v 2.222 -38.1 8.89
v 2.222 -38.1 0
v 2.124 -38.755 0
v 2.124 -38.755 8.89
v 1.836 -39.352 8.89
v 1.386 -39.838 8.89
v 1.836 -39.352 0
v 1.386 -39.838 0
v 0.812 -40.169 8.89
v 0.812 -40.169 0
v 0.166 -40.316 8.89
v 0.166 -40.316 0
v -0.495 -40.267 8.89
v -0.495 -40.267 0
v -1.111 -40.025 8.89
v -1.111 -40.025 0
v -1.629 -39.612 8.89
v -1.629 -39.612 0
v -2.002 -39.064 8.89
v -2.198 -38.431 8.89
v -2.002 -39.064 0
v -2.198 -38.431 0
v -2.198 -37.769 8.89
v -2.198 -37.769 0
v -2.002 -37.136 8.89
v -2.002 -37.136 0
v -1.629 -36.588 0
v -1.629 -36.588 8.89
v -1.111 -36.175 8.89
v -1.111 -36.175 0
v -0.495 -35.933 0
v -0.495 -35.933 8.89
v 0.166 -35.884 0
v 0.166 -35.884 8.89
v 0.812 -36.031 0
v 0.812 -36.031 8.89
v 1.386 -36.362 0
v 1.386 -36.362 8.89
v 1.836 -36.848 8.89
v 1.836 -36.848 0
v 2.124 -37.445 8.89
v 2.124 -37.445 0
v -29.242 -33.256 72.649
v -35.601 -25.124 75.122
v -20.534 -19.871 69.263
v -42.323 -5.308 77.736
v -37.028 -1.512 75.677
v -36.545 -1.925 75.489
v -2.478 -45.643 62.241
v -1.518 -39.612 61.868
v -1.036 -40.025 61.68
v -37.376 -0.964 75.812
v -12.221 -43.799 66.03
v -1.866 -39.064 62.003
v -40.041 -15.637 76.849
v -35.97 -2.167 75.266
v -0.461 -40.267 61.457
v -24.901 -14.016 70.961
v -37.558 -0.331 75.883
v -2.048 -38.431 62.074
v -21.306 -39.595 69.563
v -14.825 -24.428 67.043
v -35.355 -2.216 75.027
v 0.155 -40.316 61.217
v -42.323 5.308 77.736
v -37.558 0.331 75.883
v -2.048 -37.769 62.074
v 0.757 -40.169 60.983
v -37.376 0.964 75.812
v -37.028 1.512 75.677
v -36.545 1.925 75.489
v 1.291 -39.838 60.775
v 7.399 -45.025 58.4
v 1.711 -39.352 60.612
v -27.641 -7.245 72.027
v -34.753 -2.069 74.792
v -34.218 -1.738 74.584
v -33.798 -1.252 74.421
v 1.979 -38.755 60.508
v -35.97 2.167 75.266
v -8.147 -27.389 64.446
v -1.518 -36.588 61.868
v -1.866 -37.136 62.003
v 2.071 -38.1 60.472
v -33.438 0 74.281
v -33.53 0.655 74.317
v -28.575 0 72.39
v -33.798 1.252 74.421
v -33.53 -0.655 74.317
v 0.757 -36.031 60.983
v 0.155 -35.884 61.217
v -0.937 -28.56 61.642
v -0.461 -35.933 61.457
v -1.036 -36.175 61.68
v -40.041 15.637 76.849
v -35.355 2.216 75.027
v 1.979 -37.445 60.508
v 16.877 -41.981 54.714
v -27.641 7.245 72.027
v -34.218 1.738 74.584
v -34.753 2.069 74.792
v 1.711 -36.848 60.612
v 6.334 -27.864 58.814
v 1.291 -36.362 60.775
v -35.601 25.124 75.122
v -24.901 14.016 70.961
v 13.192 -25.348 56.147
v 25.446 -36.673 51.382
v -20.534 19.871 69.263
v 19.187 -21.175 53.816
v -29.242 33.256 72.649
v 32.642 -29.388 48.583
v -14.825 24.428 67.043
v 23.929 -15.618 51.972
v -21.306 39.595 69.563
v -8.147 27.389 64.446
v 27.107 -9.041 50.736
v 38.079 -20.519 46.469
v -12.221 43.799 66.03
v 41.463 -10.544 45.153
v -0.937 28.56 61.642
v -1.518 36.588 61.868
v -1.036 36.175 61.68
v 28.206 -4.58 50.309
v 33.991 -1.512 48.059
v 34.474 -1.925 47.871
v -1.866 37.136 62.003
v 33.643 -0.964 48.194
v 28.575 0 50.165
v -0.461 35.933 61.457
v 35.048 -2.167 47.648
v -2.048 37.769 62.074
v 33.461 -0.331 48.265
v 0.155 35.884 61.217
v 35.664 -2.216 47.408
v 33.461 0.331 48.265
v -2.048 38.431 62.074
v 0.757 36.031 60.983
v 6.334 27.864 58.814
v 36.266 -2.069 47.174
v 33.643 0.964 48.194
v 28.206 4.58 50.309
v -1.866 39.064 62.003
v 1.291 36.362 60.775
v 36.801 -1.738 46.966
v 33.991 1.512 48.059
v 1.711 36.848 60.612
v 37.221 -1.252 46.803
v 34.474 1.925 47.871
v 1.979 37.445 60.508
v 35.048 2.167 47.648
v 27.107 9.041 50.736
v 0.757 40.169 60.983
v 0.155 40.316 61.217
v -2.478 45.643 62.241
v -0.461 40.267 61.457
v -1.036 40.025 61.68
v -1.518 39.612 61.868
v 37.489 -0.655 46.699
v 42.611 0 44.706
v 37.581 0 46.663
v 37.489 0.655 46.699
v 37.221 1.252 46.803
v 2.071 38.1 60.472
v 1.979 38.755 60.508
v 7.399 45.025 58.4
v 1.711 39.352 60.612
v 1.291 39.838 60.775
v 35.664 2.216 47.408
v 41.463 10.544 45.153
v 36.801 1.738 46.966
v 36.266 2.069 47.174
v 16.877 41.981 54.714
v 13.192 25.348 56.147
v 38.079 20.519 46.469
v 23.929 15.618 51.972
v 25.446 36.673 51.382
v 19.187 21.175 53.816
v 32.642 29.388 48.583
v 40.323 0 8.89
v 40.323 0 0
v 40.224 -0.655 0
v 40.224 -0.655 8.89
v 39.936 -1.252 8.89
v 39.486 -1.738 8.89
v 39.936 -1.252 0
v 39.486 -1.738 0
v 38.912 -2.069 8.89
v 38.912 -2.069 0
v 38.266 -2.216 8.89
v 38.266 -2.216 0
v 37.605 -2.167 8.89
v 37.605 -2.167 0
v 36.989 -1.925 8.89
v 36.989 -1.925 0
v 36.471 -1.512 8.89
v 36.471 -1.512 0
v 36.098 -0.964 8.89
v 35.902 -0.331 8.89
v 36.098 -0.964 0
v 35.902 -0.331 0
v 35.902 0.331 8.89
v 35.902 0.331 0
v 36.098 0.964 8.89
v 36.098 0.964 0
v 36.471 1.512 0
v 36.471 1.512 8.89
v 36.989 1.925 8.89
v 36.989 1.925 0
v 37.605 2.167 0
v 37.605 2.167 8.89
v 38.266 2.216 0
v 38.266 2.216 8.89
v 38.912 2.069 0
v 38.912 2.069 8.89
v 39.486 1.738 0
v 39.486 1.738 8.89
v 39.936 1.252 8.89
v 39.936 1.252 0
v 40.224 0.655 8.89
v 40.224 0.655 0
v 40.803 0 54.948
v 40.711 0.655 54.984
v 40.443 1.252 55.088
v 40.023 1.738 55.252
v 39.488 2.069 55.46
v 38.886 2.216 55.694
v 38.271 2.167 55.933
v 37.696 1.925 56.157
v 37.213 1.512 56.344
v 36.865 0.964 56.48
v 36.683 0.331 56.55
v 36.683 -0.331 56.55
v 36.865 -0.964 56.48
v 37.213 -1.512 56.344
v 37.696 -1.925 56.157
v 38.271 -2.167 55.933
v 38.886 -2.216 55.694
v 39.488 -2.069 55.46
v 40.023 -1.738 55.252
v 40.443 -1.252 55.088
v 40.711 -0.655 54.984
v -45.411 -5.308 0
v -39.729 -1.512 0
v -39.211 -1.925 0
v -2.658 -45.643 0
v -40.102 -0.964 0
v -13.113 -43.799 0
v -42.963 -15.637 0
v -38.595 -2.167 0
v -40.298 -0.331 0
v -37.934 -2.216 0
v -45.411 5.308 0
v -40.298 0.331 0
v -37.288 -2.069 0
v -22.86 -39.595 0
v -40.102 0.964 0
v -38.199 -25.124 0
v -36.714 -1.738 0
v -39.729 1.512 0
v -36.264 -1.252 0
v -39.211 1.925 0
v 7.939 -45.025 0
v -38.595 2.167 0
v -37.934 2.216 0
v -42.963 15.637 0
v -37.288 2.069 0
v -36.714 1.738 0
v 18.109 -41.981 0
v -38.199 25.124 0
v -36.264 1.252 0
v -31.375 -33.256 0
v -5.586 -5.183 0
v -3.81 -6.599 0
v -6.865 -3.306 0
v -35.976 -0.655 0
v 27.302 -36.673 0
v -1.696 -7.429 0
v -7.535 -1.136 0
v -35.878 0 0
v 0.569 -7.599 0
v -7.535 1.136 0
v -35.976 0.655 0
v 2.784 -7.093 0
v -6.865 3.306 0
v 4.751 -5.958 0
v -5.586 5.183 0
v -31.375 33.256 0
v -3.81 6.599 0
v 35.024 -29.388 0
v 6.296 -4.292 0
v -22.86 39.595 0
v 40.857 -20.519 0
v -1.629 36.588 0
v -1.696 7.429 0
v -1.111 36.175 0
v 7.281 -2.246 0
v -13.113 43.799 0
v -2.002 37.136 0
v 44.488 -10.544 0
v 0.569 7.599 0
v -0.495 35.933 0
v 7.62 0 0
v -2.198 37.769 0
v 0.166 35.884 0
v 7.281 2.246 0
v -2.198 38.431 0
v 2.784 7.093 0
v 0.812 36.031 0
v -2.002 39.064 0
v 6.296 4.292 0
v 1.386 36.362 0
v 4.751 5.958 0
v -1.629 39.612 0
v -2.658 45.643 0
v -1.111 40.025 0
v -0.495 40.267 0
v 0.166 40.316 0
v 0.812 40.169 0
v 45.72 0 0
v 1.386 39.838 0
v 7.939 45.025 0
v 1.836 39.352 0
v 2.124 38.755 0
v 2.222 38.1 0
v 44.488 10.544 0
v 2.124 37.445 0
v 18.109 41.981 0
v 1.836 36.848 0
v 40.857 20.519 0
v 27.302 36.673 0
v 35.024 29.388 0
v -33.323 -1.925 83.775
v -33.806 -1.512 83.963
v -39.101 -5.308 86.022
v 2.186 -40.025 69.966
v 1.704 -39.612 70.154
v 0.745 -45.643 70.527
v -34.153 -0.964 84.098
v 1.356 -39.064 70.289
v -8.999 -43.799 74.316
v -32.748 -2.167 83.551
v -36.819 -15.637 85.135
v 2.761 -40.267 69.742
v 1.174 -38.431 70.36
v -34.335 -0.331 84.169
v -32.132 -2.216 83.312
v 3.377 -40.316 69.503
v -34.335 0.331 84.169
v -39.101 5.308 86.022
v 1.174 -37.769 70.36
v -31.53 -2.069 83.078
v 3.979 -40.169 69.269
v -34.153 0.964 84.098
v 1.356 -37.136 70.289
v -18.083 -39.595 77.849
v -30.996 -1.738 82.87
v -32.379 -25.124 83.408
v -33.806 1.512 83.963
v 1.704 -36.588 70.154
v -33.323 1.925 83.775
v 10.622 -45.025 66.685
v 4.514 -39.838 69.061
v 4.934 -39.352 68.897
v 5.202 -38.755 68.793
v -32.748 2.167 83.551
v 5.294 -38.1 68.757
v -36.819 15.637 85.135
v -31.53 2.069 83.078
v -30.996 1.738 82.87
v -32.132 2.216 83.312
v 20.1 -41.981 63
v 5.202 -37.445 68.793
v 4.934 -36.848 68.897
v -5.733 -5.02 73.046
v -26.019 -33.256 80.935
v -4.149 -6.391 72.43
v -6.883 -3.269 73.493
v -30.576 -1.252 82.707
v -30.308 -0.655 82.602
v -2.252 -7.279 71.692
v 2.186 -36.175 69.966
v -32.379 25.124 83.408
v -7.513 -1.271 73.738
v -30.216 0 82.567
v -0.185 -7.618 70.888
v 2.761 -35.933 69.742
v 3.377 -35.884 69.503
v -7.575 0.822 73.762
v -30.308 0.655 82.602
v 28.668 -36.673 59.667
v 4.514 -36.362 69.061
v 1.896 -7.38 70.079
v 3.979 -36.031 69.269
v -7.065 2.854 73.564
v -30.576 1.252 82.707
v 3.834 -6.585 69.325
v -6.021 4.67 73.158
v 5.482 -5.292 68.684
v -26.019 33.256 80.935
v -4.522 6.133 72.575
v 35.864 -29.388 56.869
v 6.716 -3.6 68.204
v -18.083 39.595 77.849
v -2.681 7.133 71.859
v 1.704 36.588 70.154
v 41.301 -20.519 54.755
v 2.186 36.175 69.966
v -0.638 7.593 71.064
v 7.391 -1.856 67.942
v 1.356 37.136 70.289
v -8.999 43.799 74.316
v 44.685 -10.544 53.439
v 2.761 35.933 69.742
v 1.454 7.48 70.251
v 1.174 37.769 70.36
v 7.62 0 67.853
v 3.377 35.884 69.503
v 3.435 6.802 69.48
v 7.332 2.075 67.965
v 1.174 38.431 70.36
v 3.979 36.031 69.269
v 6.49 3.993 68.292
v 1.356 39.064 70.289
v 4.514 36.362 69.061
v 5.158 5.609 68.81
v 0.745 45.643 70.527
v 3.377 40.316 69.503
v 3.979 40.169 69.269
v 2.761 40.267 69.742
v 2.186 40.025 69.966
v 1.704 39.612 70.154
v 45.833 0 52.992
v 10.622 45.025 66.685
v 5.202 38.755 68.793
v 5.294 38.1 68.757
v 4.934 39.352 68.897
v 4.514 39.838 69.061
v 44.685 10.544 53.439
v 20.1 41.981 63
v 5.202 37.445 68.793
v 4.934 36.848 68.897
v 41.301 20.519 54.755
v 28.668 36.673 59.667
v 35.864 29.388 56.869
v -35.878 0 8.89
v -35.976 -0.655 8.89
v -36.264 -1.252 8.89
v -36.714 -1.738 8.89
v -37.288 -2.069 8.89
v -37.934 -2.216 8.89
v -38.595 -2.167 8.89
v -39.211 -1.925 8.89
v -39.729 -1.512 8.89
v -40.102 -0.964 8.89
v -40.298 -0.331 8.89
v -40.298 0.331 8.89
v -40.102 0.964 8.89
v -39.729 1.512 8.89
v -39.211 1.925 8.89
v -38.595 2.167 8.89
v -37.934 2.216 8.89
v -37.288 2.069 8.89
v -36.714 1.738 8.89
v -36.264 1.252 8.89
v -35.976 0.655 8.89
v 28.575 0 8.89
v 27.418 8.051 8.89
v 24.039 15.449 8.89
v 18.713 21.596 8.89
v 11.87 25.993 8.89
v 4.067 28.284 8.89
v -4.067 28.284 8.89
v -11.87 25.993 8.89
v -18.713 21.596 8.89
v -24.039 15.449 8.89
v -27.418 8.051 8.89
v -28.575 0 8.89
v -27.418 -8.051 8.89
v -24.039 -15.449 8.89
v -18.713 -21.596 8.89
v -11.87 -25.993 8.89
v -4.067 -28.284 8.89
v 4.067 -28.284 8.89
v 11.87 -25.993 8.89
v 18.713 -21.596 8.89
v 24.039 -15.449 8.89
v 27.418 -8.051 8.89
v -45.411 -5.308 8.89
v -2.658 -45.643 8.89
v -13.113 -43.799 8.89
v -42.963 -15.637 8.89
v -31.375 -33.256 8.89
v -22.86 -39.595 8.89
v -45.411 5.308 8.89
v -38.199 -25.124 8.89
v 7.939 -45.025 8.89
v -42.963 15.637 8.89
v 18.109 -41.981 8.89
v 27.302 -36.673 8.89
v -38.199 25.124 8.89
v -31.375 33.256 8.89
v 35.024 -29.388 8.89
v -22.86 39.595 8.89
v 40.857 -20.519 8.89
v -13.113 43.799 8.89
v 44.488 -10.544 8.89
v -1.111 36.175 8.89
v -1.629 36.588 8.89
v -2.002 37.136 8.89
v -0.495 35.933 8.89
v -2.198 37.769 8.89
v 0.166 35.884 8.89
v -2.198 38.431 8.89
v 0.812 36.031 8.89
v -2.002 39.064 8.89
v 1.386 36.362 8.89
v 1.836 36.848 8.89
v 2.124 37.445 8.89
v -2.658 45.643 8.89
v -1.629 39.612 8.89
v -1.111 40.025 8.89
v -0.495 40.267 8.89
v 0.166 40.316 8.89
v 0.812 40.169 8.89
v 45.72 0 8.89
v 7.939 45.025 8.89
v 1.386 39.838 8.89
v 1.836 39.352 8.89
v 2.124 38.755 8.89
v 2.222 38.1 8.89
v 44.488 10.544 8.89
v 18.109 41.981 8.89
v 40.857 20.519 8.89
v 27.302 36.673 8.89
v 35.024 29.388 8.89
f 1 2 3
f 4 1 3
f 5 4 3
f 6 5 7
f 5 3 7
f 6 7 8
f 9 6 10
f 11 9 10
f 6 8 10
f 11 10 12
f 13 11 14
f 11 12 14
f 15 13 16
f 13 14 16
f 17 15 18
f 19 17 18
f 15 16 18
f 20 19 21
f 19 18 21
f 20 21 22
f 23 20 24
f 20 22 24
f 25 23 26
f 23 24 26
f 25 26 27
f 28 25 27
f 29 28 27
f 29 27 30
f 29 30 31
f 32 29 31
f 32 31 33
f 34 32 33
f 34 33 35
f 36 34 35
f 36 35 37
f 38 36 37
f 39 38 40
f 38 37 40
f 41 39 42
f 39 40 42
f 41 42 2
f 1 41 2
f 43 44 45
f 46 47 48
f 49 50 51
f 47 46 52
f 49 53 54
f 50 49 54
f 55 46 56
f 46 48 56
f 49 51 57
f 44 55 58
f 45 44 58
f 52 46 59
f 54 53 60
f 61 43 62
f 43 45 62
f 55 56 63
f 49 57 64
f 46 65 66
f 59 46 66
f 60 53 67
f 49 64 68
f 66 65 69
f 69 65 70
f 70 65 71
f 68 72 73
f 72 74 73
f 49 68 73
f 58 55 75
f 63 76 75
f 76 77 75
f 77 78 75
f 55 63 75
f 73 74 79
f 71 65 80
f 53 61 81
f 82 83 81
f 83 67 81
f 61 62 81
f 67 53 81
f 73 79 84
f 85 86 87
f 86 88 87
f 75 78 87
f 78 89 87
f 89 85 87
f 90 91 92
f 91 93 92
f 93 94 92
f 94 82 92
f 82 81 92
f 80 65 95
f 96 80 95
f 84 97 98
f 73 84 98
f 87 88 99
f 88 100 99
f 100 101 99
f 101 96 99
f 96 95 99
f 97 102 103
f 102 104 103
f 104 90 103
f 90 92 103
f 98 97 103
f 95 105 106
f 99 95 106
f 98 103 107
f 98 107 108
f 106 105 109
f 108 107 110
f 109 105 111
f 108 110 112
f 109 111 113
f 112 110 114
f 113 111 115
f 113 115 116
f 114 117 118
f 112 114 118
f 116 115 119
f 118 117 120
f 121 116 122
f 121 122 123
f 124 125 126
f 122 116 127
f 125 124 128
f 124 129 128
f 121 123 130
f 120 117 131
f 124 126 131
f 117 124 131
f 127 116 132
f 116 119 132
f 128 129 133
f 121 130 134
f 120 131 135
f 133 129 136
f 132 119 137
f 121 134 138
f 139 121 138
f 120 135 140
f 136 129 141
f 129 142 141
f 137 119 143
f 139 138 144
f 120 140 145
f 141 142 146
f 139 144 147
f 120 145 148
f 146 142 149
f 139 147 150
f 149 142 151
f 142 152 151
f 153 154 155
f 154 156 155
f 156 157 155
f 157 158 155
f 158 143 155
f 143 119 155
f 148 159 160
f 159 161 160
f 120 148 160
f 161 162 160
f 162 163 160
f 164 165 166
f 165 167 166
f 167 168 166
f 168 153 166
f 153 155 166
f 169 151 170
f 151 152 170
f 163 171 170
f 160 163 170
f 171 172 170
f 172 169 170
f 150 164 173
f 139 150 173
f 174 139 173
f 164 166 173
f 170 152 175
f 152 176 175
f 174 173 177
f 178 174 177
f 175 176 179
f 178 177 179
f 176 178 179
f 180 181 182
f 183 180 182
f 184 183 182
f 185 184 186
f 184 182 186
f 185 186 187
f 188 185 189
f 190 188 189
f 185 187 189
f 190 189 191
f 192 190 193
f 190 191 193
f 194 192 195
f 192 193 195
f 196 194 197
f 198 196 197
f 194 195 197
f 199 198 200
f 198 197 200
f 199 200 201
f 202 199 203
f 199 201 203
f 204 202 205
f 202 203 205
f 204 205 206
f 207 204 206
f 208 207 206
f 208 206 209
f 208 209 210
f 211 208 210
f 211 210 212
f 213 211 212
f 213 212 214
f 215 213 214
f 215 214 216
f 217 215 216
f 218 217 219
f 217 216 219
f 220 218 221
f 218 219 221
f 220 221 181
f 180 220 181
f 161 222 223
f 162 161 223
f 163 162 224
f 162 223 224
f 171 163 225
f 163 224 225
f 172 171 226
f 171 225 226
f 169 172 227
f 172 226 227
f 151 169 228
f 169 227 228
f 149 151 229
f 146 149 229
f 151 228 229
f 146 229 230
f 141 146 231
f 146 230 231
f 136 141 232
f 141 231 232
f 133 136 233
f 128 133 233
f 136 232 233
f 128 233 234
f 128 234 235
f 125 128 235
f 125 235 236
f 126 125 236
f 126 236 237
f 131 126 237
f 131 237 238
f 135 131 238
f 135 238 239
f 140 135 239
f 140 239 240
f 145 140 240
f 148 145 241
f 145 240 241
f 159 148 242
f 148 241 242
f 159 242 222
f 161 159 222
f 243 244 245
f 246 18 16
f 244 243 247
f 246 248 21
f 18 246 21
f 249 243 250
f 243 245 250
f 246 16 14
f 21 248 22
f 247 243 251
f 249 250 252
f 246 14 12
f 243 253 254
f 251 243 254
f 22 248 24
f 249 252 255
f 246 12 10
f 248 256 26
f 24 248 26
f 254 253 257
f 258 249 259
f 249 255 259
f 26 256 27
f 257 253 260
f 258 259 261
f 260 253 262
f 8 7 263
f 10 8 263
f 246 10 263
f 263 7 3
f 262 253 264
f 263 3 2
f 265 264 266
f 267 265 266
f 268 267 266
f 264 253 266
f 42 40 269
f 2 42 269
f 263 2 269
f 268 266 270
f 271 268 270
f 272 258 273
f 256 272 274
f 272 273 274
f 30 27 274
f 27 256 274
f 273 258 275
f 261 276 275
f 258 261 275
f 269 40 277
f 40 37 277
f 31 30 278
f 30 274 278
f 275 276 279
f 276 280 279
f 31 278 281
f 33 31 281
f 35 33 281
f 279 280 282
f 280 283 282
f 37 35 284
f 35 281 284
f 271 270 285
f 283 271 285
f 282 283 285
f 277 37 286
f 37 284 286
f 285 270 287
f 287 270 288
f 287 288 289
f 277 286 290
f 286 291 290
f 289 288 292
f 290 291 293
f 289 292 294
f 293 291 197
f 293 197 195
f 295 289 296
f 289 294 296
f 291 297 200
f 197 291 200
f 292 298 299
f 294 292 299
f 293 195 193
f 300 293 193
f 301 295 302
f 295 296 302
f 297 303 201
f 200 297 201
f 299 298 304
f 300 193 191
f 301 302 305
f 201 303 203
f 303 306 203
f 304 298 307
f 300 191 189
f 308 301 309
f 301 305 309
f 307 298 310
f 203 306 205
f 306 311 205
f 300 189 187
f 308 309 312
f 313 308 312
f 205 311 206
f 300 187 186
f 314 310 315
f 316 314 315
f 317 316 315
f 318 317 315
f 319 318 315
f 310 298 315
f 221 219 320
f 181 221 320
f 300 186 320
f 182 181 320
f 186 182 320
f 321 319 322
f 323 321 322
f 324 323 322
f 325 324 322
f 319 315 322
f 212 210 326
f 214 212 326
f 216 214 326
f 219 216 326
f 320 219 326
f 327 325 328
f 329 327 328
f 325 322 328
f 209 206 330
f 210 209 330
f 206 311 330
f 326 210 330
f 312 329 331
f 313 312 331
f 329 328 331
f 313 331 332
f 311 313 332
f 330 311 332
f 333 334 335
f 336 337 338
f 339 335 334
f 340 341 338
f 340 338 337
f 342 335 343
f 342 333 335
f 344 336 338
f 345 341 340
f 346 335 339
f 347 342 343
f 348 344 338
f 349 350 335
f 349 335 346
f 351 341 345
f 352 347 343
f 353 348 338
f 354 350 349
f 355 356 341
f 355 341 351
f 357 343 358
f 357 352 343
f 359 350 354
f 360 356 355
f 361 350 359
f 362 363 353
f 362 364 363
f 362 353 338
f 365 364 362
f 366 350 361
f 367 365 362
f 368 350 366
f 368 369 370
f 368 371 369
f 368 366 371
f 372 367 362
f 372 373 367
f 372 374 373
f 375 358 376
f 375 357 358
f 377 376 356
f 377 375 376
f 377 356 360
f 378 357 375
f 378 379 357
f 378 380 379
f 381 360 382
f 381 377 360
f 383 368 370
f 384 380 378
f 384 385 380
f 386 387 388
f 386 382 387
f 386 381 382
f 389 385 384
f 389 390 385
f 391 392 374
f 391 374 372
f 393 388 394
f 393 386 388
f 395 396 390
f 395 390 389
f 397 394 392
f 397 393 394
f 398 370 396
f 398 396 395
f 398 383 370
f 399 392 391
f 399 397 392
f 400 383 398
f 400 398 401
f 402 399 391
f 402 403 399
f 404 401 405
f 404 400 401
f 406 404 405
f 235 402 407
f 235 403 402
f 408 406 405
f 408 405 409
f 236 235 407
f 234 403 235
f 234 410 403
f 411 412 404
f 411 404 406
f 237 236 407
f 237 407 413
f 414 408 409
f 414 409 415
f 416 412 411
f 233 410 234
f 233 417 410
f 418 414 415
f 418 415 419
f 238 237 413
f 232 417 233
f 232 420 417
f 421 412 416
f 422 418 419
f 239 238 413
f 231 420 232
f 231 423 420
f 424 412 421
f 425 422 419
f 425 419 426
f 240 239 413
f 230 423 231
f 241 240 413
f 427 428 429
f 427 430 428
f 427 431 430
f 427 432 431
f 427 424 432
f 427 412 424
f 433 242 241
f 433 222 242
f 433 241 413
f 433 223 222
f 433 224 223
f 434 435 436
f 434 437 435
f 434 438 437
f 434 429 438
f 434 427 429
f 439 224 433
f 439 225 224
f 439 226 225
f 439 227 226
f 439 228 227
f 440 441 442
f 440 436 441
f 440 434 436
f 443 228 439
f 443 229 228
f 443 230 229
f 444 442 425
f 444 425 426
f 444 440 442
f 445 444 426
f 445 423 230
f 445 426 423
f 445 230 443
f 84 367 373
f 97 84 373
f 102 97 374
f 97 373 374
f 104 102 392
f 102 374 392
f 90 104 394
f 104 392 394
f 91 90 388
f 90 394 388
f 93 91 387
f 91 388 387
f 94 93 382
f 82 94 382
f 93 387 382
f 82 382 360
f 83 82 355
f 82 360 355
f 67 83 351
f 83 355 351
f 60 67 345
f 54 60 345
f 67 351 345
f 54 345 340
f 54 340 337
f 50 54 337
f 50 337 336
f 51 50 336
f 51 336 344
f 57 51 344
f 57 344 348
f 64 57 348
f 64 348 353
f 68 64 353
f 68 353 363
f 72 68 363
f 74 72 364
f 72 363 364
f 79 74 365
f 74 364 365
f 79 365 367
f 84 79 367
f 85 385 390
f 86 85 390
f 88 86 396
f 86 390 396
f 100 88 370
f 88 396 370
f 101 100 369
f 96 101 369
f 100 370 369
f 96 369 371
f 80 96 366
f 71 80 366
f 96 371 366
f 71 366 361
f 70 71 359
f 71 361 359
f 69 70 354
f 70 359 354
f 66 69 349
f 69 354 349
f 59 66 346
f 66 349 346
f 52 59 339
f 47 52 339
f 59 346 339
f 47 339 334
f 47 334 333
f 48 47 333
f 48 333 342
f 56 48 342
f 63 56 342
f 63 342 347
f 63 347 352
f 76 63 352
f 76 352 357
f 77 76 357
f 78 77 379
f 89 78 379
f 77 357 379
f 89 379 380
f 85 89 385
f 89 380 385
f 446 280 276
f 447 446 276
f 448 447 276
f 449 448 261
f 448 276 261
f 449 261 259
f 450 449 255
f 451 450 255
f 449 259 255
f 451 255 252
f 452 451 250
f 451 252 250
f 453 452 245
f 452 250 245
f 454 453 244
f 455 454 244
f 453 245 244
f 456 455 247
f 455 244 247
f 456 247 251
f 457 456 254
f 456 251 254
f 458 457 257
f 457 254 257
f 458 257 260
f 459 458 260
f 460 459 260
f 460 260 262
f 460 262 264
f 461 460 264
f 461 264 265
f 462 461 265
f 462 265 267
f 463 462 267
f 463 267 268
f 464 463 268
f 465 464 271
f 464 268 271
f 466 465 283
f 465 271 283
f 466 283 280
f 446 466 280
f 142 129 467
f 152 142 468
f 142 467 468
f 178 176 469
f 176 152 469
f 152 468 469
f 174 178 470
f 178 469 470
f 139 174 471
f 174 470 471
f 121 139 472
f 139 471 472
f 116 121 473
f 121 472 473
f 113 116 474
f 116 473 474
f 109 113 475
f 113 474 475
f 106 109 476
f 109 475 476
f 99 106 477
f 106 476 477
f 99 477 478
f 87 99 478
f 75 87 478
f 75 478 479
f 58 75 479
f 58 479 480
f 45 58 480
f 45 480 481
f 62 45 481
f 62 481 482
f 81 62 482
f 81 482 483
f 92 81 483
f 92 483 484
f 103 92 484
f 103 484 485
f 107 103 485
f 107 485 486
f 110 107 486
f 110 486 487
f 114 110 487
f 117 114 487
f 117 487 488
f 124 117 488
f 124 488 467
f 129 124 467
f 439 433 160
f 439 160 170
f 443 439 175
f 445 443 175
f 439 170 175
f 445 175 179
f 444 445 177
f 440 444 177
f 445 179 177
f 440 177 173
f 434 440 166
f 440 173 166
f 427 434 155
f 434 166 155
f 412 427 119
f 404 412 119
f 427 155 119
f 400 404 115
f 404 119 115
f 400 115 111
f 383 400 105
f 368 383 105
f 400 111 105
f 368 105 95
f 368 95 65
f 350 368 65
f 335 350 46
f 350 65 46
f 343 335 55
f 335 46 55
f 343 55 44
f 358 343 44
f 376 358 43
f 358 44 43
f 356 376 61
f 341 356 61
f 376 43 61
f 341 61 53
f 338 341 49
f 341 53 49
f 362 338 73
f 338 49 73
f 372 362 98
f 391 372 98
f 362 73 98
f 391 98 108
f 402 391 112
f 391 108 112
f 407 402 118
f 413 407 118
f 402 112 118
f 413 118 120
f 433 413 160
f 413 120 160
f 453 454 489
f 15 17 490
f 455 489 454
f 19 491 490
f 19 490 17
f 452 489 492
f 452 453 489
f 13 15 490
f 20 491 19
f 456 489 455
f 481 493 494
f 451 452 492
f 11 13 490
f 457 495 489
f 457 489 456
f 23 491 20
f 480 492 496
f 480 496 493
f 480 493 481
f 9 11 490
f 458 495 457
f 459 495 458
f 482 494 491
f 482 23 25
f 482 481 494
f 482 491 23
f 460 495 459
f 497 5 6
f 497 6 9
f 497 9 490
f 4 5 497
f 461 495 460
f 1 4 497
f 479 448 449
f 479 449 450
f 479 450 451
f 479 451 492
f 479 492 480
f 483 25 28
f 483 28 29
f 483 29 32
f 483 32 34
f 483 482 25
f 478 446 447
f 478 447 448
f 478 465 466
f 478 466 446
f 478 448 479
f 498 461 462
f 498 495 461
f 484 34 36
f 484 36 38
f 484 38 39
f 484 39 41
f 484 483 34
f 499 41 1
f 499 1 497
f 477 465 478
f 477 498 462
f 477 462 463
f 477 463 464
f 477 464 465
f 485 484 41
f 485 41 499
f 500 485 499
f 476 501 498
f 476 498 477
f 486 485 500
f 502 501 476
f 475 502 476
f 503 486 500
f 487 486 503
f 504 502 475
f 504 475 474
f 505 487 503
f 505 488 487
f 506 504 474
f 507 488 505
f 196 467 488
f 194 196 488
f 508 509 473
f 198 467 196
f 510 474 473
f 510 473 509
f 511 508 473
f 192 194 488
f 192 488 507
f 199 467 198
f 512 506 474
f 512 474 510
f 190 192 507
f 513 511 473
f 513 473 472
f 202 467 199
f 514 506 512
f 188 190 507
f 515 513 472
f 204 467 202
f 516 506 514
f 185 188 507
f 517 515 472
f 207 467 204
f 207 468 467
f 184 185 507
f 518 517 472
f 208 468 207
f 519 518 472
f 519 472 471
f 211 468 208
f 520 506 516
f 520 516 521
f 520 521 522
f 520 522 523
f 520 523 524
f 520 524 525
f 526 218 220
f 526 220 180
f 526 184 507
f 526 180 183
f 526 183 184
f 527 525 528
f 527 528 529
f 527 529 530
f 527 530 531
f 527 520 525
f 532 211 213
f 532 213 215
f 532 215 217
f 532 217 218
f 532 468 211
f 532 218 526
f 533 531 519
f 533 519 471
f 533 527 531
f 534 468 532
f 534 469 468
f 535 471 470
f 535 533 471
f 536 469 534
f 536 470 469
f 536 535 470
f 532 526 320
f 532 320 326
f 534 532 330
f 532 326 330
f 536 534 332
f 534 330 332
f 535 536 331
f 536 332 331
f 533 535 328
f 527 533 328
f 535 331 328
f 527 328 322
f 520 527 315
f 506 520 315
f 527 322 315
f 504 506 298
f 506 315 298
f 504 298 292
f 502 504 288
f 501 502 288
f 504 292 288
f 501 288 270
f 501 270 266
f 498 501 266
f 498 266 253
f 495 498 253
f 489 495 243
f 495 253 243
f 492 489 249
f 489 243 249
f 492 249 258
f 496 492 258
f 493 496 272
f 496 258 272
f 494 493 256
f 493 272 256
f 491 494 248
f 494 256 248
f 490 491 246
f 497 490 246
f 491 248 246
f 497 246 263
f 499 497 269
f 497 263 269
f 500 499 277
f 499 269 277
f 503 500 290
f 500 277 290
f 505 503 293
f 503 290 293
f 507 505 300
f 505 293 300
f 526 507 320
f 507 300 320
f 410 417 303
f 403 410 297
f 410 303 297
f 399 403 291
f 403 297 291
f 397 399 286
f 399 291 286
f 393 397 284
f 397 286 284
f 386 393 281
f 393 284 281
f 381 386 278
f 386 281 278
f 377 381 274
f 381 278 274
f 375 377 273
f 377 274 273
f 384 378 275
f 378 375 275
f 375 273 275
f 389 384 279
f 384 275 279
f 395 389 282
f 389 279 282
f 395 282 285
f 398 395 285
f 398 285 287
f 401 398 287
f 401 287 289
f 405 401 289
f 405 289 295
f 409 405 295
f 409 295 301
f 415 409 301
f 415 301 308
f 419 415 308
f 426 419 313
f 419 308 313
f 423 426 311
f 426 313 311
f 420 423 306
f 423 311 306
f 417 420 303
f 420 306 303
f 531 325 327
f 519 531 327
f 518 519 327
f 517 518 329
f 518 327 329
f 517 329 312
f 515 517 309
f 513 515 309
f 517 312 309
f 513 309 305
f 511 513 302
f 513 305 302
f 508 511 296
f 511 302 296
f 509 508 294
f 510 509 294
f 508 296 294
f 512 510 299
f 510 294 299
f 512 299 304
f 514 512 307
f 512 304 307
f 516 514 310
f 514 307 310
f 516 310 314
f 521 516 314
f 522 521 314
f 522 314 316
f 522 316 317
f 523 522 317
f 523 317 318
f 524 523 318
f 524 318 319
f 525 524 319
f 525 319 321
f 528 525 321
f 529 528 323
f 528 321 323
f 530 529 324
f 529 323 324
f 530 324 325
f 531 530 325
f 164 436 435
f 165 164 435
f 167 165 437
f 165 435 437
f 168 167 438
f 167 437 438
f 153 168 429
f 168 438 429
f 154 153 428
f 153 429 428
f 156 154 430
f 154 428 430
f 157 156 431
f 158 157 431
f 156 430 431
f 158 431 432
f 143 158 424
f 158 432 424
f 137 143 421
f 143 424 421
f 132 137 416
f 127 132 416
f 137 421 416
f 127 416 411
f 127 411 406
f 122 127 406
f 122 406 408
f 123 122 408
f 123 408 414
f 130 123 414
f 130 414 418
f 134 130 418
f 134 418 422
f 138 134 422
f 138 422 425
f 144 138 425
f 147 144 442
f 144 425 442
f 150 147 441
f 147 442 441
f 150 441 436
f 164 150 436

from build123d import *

# Parameters (mm, degrees)
F0_R          = 45.72
F1_DEPTH      = 8.89
F2_R          = 28.575
F3_DEPTH      = 63.5
F5_DEPTH      = 45.721
F5_DEPTH_BACK = 45.721
F6_R          = 45.72
F7_DEPTH      = 8.89
F8_R          = 7.62
F9_DEPTH      = 86.13506459
F10_R         = 2.2225
F11_DEPTH     = 8.89
F12_R         = 2.2225
F13_DEPTH     = 8.89


with BuildPart() as f1:
    # F0 (on Top) → F1 (new body)
    with BuildSketch(Plane.XY):
        Circle(F0_R)
    extrude(amount=F1_DEPTH)

    # F2 (on face) → F3 (join)
    with BuildSketch(Plane.XY.offset(8.89)):
        Circle(F2_R)
    extrude(amount=F3_DEPTH)

    # F4 (on Front) → F5 (cut, two sides)
    with BuildSketch(Plane.XZ) as f5_sk:
        Polygon((28.575, 72.39), (-28.575, 72.39), (28.575, 50.165), align=None)
    extrude(amount=-F5_DEPTH, mode=Mode.SUBTRACT)
    extrude(f5_sk.sketch, amount=F5_DEPTH_BACK, mode=Mode.SUBTRACT)

    # F6 (on face) → F7 (join)
    with BuildSketch(Plane(origin=(20.6996380697, 0, 53.2276407507), x_dir=(0.9320046715, 0, -0.3624462612), z_dir=(0.3624462612, 0, 0.9320046715))):
        with Locations((-22.2098007679, 0)):
            Circle(F6_R)
    extrude(amount=F7_DEPTH)

    # F8 (on face) → F9 (cut, through all)
    with BuildSketch(Plane(origin=(0, 0, 0), x_dir=(1, 0, 0), z_dir=(0, 0, -1))):
        Circle(F8_R)
    extrude(amount=-F9_DEPTH, mode=Mode.SUBTRACT)

    # F10 (on face) → F11 (cut, through all)
    with BuildSketch(Plane(origin=(0, 0, 0), x_dir=(1, 0, 0), z_dir=(0, 0, -1))):
        with Locations((0, -38.1)):
            Circle(F10_R)
        with Locations((38.1, 0)):
            Circle(F10_R)
        with Locations((0, 38.1)):
            Circle(F10_R)
        with Locations((-38.1, 0)):
            Circle(F10_R)
    extrude(amount=-F11_DEPTH, mode=Mode.SUBTRACT)

    # F12 (on face) → F13 (cut, through all)
    with BuildSketch(Plane(origin=(23.9217853314, 0, 61.5131622807), x_dir=(0.9320046715, 0, -0.3624462612), z_dir=(0.3624462612, 0, 0.9320046715))):
        with Locations((-22.2098007679, -38.1)):
            Circle(F12_R)
        with Locations((15.8901992321, 0)):
            Circle(F12_R)
        with Locations((-60.3098007679, 0)):
            Circle(F12_R)
        with Locations((-22.2098007679, 38.1)):
            Circle(F12_R)
    extrude(amount=-F13_DEPTH, mode=Mode.SUBTRACT)


solid = f1.part
